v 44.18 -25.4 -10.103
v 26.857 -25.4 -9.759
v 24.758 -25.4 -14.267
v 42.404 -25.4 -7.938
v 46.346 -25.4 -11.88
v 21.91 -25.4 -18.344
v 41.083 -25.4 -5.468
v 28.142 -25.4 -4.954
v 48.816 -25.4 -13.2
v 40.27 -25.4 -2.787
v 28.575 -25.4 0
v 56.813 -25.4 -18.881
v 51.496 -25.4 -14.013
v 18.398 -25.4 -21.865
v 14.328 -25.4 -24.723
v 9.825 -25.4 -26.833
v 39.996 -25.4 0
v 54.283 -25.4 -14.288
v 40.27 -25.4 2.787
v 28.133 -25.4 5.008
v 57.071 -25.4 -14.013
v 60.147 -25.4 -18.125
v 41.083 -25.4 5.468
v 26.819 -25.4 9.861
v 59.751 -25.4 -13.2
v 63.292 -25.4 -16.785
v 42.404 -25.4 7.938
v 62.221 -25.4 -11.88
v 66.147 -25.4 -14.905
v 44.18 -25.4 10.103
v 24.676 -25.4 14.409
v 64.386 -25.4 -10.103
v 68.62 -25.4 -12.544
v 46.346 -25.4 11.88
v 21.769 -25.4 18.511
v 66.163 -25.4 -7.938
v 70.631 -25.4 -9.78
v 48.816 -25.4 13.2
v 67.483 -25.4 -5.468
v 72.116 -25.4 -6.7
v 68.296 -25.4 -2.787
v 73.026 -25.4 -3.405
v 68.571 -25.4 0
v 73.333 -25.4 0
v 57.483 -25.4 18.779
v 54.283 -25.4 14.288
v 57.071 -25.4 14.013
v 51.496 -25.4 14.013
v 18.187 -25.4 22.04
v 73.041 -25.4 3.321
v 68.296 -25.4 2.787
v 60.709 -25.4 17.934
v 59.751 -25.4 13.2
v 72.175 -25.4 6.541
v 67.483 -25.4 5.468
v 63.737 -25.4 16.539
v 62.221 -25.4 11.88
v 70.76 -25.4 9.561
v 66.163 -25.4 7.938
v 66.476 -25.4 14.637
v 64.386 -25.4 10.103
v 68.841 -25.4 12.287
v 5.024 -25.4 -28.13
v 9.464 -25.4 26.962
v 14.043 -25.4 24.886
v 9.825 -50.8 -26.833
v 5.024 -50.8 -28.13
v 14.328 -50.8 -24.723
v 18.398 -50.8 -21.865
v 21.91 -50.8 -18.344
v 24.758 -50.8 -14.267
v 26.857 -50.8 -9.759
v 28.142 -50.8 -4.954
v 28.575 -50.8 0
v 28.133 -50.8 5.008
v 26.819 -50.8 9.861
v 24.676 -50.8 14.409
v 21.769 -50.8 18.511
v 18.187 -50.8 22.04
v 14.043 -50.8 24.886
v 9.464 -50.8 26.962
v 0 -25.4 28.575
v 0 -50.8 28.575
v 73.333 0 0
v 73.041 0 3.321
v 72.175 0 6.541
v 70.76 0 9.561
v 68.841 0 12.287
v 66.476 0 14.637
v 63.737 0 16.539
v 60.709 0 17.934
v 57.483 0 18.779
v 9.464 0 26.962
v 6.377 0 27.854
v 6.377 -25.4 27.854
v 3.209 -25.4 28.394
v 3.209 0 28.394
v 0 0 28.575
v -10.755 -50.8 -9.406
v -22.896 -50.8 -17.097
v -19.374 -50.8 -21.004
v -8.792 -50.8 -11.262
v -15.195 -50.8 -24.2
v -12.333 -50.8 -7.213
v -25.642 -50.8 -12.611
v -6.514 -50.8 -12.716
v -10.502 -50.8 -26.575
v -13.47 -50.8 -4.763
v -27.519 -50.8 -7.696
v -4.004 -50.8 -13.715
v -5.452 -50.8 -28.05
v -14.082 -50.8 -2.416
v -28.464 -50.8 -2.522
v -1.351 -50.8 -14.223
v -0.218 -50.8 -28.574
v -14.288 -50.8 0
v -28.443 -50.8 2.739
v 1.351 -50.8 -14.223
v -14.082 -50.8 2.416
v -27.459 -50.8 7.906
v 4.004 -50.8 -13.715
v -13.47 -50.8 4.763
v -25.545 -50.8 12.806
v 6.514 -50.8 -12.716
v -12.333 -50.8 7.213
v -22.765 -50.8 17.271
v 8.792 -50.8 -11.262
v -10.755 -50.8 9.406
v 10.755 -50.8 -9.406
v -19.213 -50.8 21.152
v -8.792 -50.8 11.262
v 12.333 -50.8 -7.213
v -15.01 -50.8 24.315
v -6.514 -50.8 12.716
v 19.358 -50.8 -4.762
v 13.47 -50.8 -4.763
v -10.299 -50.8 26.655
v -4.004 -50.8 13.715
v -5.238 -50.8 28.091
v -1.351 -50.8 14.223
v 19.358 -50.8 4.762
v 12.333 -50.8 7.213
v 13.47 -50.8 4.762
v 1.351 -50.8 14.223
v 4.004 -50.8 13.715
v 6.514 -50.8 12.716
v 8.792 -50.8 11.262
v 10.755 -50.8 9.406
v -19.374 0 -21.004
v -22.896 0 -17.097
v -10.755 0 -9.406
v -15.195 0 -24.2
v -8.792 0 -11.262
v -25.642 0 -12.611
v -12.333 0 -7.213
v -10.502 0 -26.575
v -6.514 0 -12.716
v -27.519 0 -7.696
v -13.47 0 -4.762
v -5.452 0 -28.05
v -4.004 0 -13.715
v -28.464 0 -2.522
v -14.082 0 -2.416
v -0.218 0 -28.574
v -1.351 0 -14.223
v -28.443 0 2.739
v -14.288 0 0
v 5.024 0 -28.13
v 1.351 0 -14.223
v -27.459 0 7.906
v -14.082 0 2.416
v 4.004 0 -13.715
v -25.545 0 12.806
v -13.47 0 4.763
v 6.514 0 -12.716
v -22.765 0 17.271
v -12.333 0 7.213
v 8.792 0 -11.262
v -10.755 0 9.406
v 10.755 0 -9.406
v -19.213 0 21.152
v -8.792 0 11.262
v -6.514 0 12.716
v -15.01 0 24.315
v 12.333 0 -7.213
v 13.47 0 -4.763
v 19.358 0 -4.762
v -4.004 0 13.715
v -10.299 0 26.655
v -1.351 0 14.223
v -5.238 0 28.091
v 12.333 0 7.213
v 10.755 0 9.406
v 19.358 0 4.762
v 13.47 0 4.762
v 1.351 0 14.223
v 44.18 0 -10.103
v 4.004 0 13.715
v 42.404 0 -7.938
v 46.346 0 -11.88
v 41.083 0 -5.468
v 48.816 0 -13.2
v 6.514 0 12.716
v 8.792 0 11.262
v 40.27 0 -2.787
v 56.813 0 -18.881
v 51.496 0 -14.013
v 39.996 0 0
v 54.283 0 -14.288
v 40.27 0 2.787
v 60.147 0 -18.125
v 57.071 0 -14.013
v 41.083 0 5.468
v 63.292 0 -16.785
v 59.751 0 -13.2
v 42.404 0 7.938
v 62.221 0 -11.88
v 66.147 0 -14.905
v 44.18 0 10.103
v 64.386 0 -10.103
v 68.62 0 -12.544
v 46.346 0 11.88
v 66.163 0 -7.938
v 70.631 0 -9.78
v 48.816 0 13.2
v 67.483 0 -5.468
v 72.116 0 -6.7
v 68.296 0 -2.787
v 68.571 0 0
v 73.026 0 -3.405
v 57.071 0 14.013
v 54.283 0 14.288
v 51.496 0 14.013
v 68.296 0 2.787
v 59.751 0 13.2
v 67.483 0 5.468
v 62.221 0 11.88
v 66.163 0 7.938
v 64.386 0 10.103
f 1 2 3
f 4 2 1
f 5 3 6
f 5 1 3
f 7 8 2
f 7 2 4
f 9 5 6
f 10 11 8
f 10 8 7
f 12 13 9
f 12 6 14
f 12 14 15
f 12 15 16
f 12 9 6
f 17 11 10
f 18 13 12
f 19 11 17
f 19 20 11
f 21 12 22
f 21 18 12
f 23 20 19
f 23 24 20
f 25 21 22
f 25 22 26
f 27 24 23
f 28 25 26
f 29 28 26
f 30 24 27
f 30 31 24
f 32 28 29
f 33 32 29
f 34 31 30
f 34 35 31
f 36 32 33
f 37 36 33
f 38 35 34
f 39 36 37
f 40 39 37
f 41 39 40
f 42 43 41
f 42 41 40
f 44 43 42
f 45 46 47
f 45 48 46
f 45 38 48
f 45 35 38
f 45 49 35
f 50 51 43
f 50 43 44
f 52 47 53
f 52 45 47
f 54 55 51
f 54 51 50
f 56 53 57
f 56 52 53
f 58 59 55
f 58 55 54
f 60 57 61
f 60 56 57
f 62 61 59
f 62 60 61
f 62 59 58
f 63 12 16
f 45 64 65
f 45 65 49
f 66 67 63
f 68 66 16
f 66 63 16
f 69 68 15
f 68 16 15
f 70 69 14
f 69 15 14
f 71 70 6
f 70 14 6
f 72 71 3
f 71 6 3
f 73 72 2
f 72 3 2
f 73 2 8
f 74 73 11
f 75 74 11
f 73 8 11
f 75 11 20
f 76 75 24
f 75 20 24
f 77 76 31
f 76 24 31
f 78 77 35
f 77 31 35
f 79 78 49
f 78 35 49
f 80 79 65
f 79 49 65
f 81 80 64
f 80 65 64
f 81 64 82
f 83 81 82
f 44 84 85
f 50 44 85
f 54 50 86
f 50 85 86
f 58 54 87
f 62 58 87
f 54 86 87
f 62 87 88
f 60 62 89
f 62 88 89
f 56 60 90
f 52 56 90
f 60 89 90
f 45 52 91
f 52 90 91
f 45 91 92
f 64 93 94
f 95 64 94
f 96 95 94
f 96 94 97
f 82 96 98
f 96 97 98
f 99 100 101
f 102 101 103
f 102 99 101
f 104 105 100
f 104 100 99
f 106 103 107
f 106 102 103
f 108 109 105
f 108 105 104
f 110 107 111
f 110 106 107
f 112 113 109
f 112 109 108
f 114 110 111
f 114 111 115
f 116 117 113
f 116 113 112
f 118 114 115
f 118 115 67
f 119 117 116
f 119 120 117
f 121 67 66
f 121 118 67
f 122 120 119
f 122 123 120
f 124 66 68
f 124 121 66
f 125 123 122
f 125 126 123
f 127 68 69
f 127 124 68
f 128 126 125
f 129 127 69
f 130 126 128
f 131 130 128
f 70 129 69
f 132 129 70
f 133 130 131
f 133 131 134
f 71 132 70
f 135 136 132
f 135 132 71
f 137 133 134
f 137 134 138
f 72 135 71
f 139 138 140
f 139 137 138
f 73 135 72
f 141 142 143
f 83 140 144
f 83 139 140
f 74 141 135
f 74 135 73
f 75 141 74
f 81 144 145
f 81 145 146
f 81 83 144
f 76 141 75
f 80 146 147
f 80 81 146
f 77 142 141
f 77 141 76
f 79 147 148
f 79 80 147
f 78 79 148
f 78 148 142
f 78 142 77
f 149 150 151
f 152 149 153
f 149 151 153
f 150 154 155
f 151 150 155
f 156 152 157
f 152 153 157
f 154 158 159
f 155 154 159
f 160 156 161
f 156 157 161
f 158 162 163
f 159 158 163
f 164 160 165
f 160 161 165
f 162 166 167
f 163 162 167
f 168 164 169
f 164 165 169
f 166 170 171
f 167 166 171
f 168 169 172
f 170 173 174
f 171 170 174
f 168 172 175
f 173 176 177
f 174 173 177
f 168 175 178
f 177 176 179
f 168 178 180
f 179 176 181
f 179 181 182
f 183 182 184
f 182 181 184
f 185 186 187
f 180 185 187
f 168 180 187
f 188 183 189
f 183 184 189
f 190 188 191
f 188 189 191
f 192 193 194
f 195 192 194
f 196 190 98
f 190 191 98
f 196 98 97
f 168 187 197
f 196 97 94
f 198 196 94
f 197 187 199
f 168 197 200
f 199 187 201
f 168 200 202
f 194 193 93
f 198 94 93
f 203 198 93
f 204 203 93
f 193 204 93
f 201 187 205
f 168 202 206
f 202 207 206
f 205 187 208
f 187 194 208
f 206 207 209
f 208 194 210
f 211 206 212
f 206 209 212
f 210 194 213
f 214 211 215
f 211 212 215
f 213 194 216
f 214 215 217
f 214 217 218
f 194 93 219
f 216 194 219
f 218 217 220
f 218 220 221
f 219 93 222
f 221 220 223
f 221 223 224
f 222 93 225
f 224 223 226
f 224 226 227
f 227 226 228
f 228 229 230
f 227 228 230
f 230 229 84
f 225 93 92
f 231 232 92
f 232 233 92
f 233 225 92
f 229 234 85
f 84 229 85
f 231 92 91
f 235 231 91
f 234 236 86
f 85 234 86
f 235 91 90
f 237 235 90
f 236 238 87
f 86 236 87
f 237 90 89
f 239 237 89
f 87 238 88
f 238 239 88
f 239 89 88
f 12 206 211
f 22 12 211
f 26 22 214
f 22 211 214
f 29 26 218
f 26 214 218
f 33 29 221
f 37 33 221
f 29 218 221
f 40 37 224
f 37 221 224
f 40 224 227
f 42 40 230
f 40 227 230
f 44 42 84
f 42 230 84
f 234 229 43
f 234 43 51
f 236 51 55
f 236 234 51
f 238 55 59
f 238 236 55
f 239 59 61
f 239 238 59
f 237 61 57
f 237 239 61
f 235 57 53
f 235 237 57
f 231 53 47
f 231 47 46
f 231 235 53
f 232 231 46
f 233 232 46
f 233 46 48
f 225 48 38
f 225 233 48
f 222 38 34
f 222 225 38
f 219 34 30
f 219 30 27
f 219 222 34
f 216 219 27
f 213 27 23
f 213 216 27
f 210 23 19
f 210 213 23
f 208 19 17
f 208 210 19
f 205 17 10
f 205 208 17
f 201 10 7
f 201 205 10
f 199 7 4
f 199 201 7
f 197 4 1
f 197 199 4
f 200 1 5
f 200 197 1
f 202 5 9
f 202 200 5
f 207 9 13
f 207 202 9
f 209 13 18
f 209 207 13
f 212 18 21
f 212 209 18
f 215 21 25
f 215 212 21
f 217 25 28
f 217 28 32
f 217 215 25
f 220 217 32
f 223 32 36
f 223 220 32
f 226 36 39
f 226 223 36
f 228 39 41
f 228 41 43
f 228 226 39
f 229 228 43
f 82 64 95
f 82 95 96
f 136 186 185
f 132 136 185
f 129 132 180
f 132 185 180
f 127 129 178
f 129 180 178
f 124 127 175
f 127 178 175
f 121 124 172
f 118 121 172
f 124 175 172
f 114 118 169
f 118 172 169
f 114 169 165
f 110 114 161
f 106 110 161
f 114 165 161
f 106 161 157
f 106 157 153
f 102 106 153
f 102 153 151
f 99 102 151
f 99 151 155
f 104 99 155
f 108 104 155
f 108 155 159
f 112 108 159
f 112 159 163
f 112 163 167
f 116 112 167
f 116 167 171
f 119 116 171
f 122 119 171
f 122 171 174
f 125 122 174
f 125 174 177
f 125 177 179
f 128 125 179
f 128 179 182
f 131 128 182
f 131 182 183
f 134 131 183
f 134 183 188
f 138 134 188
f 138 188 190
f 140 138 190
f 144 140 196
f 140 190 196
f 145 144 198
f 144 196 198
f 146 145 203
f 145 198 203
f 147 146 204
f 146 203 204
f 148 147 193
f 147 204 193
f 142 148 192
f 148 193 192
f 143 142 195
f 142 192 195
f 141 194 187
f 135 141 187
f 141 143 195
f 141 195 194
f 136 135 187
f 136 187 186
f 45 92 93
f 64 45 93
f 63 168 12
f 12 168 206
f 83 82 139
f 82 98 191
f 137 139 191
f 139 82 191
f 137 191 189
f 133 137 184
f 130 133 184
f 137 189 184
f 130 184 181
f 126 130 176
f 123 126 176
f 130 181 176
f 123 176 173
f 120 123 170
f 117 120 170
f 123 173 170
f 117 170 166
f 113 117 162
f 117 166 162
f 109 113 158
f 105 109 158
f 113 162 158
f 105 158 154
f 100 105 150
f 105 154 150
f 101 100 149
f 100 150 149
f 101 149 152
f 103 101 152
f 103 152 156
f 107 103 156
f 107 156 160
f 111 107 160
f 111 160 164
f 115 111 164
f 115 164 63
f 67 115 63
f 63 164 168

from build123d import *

# Parameters (mm, degrees)
F0_R     = 14.2875
F1_DEPTH = 25.4
F2_DEPTH = 50.8


with BuildPart() as f1:
    # F0 (on Front) → F1 (new body)
    with BuildSketch(Plane.XZ):
        with BuildLine():
            ThreePointArc((5.0235075245, -28.1299661776), (21.9097849432, -18.3437168737), (28.575, 0))
            ThreePointArc((28.575, 0), (23.3127267057, 16.5241459249), (9.4640709678, 26.9622325803))
            Line((9.4640709678, 26.9622325803), (0, 28.575))
            ThreePointArc((0, 28.575), (-28.4635241012, -2.5215909141), (5.0235075245, -28.1299661776))
        make_face()
        with BuildLine():
            ThreePointArc((-13.4703841816, 4.7625), (0, 14.2875), (13.4703841816, 4.7625))
            Line((13.4703841816, 4.7625), (19.3582428957, 4.7625))
            Line((19.3582428957, 4.7625), (19.3582428957, -4.7625))
            Line((19.3582428957, -4.7625), (13.4703841816, -4.7625))
            ThreePointArc((13.4703841816, -4.7625), (0, -14.2875), (-13.4703841816, -4.7625))
            Line((-13.4703841816, -4.7625), (-18.7417571043, -4.7625))
            Line((-18.7417571043, -4.7625), (-18.7417571043, 4.7625))
            Line((-18.7417571043, 4.7625), (-13.4703841816, 4.7625))
        make_face(mode=Mode.SUBTRACT)
        with BuildLine():
            ThreePointArc((9.4640709678, 26.9622325803), (23.3127267057, 16.5241459249), (28.575, 0))
            ThreePointArc((28.575, 0), (21.9097849432, -18.3437168737), (5.0235075245, -28.1299661776))
            Line((5.0235075245, -28.1299661776), (56.8131846517, -18.881257763))
            ThreePointArc((56.8131846517, -18.881257763), (35.2362588947, 0.3389697117), (57.4834105655, 18.7792818522))
            Line((57.4834105655, 18.7792818522), (9.4640709678, 26.9622325803))
        make_face()
        with BuildLine():
            Line((0, 28.575), (9.4640709678, 26.9622325803))
            ThreePointArc((9.4640709678, 26.9622325803), (4.8002515047, 28.1689227783), (0, 28.575))
        make_face()
        with BuildLine():
            ThreePointArc((73.3332428957, 0), (68.84115645, 12.2869708612), (57.4834105655, 18.7792818522))
            ThreePointArc((57.4834105655, 18.7792818522), (35.2362588947, 0.3389697117), (56.8131846517, -18.881257763))
            ThreePointArc((56.8131846517, -18.881257763), (68.6202211417, -12.5440645237), (73.3332428957, 0))
        make_face()
        with Locations((54.2832428957, 0)):
            Circle(F0_R, mode=Mode.SUBTRACT)
    extrude(amount=F1_DEPTH)

    # F0 (on Front) → F2 (join)
    with BuildSketch(Plane.XZ):
        with BuildLine():
            ThreePointArc((5.0235075245, -28.1299661776), (21.9097849432, -18.3437168737), (28.575, 0))
            ThreePointArc((28.575, 0), (23.3127267057, 16.5241459249), (9.4640709678, 26.9622325803))
            Line((9.4640709678, 26.9622325803), (0, 28.575))
            ThreePointArc((0, 28.575), (-28.4635241012, -2.5215909141), (5.0235075245, -28.1299661776))
        make_face()
        with BuildLine():
            ThreePointArc((-13.4703841816, 4.7625), (0, 14.2875), (13.4703841816, 4.7625))
            Line((13.4703841816, 4.7625), (19.3582428957, 4.7625))
            Line((19.3582428957, 4.7625), (19.3582428957, -4.7625))
            Line((19.3582428957, -4.7625), (13.4703841816, -4.7625))
            ThreePointArc((13.4703841816, -4.7625), (0, -14.2875), (-13.4703841816, -4.7625))
            Line((-13.4703841816, -4.7625), (-18.7417571043, -4.7625))
            Line((-18.7417571043, -4.7625), (-18.7417571043, 4.7625))
            Line((-18.7417571043, 4.7625), (-13.4703841816, 4.7625))
        make_face(mode=Mode.SUBTRACT)
        with BuildLine():
            ThreePointArc((-13.4703841816, -4.7625), (-14.2875, 0), (-13.4703841816, 4.7625))
            Line((-13.4703841816, 4.7625), (-18.7417571043, 4.7625))
            Line((-18.7417571043, 4.7625), (-18.7417571043, -4.7625))
            Line((-18.7417571043, -4.7625), (-13.4703841816, -4.7625))
        make_face()
    extrude(amount=F2_DEPTH)


solid = f1.part
